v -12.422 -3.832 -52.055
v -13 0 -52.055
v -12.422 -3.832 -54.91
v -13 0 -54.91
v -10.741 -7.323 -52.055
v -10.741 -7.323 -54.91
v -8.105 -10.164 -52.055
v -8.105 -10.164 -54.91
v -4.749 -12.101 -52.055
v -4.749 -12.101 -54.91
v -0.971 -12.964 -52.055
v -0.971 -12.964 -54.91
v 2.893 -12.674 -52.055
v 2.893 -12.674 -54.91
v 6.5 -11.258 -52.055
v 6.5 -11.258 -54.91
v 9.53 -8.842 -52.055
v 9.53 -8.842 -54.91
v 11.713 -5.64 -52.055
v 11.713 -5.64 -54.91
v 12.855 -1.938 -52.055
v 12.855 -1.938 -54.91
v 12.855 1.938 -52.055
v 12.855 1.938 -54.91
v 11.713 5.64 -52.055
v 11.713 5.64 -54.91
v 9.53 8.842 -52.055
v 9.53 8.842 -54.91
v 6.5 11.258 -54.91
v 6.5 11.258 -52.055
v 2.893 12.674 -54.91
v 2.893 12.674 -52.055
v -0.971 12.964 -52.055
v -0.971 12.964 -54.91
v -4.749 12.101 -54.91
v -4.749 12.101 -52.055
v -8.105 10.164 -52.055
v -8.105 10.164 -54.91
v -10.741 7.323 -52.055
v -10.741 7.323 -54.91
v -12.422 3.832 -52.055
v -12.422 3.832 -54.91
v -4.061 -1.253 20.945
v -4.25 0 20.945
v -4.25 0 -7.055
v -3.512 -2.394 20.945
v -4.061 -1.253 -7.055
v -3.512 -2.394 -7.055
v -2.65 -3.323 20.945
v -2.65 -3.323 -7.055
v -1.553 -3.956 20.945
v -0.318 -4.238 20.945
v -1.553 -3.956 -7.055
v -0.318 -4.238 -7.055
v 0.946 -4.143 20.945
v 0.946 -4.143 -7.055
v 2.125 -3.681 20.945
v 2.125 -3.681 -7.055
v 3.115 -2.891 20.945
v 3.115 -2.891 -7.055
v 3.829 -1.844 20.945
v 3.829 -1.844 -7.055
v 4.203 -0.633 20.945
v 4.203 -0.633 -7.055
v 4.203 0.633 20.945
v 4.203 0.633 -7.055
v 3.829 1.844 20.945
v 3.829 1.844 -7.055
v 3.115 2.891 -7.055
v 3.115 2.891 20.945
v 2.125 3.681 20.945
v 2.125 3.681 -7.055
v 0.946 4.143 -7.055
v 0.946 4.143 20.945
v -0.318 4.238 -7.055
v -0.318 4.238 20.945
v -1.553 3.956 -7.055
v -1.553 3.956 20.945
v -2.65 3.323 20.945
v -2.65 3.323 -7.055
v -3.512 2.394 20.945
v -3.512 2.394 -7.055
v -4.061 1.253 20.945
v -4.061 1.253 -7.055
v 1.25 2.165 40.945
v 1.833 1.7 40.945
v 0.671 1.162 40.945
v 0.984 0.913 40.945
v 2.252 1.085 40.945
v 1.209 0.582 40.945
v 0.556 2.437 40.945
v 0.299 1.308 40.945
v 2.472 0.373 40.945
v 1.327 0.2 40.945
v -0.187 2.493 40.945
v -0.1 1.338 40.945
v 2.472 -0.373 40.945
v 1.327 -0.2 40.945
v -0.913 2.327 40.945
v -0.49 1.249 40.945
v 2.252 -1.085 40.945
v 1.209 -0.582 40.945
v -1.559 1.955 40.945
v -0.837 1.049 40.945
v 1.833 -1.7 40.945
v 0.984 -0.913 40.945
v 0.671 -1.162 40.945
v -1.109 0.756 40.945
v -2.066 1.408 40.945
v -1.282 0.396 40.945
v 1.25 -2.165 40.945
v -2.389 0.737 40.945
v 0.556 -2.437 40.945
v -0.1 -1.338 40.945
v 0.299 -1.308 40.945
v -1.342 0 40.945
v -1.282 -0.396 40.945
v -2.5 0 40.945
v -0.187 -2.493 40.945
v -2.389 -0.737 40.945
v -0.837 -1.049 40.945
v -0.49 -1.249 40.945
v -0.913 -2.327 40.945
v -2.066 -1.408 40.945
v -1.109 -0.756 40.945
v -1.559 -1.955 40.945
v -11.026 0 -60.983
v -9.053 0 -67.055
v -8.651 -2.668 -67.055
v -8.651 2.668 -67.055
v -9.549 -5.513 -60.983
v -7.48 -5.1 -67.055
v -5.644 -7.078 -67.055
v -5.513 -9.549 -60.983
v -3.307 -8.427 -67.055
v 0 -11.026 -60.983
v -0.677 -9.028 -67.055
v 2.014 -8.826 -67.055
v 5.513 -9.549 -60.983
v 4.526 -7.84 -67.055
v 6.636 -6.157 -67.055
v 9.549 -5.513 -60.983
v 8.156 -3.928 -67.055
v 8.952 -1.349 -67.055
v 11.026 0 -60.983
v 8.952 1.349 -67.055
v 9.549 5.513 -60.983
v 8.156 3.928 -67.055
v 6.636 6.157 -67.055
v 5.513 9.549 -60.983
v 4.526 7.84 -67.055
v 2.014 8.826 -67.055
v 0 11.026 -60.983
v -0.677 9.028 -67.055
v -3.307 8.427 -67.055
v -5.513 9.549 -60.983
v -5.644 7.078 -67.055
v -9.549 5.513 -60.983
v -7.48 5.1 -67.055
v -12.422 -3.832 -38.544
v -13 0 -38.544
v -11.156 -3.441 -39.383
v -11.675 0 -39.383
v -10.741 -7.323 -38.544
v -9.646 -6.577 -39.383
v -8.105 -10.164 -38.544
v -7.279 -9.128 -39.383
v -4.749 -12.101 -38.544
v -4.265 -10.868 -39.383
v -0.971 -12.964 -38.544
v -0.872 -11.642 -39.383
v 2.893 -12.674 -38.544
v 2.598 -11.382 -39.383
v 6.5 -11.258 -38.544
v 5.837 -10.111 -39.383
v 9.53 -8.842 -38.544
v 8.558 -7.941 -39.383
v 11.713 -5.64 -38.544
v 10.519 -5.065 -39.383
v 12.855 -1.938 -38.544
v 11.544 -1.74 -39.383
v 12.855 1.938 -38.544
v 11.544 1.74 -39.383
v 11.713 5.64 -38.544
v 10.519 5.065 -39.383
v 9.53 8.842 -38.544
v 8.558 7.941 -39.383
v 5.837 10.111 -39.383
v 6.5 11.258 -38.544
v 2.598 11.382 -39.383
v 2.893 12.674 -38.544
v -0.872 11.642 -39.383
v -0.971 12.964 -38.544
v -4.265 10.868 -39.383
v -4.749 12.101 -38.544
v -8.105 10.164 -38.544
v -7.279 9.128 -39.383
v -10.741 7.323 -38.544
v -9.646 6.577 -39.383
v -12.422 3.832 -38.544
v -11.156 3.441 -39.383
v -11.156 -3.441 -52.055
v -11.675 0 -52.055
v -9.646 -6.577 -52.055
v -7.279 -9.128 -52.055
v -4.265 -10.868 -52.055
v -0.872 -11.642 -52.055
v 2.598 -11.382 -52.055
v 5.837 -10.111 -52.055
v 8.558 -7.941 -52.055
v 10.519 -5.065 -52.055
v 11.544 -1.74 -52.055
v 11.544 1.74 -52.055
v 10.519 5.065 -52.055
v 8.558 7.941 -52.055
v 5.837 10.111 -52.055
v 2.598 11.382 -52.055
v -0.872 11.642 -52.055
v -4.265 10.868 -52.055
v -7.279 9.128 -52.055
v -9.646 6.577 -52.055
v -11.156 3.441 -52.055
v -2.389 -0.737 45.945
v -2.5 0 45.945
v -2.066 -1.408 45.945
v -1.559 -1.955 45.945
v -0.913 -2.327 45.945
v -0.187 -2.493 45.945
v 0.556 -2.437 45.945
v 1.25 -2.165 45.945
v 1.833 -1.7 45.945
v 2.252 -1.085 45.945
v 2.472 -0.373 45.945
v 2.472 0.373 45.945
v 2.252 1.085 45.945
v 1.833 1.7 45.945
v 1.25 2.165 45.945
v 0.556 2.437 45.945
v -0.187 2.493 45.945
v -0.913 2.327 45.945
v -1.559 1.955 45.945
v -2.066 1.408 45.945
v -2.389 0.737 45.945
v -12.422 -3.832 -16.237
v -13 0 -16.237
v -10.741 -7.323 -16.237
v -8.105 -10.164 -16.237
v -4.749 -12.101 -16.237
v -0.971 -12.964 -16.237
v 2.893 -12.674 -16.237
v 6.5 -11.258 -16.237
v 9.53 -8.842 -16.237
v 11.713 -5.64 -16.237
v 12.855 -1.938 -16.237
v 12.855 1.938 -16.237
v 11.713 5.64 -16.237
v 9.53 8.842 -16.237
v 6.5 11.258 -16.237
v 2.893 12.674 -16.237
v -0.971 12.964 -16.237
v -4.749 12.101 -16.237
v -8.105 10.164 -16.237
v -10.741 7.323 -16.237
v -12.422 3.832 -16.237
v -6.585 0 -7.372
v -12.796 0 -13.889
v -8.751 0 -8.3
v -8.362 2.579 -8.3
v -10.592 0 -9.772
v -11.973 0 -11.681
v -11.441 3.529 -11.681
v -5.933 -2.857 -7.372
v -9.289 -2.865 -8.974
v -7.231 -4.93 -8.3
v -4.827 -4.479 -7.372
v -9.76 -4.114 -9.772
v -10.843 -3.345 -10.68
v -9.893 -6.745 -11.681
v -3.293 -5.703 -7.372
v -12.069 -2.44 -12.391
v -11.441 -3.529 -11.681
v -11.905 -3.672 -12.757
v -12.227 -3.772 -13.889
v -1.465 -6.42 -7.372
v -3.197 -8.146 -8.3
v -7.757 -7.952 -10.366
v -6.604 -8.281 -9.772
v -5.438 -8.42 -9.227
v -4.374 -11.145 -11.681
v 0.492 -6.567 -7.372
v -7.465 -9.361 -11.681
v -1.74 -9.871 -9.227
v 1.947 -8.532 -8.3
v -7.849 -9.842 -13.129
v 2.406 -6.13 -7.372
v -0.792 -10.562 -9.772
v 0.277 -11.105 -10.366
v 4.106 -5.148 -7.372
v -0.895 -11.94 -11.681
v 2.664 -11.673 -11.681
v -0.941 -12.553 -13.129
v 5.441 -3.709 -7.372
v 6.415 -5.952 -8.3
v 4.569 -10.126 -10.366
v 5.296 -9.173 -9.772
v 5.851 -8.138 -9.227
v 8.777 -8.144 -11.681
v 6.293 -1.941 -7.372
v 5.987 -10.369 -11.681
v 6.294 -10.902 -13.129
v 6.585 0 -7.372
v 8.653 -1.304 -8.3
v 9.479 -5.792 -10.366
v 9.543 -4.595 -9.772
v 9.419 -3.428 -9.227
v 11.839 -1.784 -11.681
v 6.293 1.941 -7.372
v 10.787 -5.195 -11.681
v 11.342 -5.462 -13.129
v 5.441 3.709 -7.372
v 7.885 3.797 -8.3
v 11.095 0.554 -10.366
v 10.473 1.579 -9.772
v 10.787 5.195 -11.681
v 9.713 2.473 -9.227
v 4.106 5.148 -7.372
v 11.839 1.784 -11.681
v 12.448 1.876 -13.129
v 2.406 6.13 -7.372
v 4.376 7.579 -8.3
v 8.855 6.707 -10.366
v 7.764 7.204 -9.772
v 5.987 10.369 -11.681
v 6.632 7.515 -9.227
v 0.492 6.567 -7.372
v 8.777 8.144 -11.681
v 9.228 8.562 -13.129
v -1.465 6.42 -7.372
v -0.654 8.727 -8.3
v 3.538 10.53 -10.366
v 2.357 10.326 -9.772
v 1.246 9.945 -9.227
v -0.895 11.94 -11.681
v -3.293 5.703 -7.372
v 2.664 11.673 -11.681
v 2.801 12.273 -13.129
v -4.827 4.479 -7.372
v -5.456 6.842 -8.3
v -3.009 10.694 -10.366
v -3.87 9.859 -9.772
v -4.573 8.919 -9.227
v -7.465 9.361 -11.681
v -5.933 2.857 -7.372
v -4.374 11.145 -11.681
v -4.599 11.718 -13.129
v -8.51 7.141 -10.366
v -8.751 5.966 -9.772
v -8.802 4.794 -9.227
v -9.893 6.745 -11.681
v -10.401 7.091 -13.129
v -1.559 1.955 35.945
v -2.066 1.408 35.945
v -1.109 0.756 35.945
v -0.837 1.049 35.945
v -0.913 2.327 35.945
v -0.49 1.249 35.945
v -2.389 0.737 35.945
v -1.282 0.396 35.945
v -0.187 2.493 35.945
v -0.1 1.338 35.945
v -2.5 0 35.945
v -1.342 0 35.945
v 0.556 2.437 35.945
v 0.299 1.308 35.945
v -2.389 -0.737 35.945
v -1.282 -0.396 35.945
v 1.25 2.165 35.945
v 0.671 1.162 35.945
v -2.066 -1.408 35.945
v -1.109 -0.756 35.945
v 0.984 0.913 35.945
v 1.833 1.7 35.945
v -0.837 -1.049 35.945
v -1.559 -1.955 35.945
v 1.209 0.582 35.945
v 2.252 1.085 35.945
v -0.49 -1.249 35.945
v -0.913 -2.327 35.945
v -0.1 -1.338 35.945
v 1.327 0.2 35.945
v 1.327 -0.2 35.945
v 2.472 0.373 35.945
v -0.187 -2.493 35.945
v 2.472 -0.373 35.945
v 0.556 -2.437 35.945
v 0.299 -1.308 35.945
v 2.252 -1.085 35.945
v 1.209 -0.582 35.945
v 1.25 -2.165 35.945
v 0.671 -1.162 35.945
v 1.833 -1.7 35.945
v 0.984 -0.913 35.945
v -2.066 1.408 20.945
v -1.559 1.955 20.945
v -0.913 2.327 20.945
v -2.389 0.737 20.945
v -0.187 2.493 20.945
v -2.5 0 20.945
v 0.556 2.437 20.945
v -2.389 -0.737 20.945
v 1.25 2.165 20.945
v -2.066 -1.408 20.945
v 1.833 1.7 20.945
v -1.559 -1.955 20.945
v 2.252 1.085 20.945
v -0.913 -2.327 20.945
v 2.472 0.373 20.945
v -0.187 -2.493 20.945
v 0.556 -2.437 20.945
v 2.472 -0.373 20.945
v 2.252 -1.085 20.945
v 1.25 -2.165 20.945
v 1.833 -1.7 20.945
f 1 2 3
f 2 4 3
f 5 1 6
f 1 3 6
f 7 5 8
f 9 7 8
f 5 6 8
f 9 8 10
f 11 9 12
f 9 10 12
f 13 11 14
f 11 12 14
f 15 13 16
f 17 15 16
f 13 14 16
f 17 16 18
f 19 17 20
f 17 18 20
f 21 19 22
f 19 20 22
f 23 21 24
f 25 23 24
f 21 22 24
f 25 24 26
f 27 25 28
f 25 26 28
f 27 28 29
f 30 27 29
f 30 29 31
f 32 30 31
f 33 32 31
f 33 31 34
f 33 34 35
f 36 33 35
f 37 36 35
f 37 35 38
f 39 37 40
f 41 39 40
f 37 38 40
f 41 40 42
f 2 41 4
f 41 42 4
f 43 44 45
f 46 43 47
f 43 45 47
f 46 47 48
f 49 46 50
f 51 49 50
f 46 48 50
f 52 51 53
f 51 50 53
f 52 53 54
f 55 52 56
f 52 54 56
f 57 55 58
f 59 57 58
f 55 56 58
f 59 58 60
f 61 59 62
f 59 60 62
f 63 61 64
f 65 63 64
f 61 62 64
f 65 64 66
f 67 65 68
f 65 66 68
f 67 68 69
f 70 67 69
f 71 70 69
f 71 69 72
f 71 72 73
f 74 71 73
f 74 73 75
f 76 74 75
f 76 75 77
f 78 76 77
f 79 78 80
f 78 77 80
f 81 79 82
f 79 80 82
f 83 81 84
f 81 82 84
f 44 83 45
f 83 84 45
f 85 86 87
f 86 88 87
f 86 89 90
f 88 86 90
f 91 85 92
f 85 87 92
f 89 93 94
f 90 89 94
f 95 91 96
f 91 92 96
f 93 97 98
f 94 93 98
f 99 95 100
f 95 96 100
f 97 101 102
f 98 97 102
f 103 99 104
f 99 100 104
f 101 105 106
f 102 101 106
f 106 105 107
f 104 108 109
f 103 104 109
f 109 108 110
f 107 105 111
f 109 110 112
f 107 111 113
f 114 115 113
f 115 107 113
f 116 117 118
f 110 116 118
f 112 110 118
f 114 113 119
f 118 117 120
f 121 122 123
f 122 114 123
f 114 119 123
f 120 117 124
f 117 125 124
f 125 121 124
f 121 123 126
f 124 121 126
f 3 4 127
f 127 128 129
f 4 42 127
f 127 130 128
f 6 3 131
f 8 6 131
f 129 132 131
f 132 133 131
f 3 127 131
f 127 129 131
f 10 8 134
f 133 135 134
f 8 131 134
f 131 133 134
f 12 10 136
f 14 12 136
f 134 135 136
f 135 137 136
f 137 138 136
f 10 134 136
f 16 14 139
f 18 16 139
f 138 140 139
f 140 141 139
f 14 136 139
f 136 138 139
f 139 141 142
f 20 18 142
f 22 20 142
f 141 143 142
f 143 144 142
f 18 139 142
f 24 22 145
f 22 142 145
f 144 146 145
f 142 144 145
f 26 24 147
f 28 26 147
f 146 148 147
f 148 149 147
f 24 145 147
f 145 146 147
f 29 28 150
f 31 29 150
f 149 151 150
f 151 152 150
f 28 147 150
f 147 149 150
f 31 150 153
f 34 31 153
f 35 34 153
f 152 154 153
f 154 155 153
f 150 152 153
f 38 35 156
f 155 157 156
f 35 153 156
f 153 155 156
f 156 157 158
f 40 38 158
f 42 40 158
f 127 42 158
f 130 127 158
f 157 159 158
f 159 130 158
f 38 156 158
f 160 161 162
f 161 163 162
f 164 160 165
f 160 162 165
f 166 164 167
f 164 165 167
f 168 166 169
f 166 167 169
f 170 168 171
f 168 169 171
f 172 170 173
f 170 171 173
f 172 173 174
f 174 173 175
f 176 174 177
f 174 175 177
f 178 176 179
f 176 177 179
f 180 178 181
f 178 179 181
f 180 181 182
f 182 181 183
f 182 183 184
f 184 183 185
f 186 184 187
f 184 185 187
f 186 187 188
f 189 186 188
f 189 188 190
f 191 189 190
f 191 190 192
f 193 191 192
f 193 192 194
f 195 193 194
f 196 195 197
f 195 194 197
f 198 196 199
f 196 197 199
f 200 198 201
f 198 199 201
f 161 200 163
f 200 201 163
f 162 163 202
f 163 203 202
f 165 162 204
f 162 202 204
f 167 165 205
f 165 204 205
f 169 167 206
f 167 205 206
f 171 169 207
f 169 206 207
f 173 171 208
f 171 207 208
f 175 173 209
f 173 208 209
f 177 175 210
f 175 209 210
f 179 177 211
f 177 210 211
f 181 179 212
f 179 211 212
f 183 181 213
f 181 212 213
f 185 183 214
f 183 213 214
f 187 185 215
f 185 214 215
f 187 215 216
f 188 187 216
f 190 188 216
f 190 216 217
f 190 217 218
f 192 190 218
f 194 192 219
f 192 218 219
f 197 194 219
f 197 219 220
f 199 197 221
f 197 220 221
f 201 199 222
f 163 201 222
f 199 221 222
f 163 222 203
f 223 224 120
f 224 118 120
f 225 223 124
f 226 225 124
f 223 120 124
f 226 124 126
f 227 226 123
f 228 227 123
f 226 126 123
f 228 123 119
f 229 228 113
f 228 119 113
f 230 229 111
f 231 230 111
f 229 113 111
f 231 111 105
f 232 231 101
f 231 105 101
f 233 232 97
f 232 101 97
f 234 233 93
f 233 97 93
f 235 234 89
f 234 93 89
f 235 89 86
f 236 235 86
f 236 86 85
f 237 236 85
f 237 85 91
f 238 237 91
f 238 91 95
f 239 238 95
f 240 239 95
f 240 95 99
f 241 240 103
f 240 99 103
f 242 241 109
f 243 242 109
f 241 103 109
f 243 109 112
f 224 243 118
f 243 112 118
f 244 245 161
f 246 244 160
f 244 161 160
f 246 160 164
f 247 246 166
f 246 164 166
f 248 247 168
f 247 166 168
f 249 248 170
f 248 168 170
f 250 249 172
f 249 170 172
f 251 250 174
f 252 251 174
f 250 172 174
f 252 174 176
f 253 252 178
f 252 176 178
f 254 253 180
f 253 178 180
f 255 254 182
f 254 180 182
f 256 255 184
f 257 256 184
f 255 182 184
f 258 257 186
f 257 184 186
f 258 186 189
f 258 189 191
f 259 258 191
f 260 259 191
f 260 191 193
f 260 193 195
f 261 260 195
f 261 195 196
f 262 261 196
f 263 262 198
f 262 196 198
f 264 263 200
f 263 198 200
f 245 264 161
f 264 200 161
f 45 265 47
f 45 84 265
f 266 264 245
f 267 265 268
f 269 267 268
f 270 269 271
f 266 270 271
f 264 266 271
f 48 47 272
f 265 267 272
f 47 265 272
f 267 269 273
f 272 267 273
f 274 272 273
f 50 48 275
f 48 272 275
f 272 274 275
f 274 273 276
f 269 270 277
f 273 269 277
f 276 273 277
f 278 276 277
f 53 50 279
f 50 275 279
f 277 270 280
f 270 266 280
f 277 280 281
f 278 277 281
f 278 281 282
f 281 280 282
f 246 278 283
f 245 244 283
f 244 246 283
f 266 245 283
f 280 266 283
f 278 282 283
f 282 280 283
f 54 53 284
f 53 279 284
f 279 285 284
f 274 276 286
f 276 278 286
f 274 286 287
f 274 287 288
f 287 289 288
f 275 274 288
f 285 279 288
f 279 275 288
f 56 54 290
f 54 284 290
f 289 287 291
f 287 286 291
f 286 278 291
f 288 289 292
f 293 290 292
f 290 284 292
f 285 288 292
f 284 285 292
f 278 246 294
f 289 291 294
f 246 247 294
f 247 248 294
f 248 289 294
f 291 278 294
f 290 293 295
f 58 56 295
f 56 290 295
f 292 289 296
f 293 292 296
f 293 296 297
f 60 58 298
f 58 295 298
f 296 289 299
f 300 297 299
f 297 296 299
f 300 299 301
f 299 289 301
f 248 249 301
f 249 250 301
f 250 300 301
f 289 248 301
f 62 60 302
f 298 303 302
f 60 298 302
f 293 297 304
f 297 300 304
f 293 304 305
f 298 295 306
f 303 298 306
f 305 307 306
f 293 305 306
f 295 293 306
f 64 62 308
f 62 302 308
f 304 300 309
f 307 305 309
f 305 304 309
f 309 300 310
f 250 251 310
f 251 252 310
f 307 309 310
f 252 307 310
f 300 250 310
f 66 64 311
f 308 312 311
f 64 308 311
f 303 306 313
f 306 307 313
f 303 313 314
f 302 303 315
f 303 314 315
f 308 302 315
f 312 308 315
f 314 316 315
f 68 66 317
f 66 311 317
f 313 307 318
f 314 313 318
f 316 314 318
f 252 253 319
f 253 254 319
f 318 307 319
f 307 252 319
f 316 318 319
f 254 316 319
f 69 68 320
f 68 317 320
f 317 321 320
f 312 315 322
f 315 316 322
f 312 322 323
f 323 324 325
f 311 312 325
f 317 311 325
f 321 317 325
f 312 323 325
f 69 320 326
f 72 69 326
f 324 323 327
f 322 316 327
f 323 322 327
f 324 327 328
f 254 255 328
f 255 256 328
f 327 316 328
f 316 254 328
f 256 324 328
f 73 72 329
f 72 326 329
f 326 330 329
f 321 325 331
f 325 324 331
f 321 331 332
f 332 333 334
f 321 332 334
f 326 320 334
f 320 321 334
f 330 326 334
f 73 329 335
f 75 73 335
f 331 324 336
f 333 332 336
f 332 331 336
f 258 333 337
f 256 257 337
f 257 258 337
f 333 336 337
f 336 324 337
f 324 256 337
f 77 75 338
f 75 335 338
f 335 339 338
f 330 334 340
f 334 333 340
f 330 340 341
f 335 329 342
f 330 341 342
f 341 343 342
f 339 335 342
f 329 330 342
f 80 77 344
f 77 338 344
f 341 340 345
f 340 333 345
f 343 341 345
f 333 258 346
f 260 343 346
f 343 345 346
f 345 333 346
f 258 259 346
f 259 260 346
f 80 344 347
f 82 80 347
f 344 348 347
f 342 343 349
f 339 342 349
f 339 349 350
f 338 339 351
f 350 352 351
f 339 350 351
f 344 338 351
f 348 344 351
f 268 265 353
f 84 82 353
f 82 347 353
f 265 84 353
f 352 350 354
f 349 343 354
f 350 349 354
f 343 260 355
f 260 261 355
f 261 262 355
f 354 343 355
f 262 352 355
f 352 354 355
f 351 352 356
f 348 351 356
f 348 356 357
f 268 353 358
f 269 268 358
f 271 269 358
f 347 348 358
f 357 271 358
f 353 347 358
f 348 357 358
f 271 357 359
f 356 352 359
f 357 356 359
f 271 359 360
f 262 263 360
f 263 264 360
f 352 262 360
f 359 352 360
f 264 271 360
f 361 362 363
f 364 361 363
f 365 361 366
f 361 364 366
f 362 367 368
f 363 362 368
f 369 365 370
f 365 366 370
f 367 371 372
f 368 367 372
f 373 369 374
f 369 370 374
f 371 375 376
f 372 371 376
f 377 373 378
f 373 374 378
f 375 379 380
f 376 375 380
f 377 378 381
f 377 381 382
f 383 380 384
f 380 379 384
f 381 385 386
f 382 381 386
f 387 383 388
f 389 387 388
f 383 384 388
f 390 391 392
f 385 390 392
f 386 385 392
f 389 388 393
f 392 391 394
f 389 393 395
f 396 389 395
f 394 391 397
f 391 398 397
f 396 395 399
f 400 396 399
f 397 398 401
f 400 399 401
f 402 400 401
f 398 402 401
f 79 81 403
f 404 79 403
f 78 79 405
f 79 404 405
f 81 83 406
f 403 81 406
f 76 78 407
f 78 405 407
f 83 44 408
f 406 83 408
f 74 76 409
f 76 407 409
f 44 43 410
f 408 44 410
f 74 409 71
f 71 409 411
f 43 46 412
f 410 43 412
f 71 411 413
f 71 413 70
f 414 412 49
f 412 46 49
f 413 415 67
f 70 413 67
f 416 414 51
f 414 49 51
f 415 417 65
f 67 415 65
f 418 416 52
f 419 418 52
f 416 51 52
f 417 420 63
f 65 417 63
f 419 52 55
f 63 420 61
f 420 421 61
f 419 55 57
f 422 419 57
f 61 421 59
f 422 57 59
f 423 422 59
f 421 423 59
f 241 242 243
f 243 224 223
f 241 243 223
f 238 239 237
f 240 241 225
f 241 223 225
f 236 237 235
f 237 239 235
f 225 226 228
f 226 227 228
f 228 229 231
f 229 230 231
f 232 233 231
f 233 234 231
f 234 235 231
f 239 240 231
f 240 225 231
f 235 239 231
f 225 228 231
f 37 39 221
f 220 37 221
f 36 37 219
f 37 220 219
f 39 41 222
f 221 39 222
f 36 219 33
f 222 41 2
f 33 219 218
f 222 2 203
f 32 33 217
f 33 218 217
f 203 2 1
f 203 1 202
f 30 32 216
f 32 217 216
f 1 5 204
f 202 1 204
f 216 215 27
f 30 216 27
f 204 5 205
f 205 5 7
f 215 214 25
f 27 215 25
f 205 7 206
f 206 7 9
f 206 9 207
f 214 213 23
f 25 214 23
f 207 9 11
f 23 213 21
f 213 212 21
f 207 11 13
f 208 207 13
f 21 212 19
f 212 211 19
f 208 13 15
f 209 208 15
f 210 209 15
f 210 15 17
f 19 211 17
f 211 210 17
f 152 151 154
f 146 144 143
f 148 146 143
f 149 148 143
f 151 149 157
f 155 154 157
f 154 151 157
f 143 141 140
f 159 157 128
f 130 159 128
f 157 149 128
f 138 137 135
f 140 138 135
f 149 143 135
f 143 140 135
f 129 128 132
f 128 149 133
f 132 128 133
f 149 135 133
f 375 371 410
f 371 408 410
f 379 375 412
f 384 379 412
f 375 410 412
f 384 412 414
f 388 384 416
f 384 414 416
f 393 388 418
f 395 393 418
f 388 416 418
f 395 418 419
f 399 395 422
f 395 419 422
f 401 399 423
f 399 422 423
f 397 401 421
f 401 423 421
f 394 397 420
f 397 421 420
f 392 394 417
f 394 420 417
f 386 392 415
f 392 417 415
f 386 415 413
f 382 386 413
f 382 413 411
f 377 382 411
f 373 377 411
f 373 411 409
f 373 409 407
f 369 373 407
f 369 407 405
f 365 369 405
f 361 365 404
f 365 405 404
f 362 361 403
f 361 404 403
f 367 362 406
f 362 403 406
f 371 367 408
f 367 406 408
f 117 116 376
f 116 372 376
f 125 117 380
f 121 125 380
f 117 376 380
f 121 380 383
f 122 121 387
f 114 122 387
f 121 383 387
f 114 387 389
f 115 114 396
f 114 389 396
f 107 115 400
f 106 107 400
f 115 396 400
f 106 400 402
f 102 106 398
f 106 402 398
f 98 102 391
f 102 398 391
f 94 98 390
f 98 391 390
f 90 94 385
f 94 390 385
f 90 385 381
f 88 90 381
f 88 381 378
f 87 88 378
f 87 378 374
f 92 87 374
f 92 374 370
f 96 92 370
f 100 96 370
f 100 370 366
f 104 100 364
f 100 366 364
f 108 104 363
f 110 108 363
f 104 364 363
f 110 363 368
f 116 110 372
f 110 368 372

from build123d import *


with BuildPart() as f1:
    # F0 (on Front) → F1 (revolve)
    with BuildSketch(Plane.XZ):
        with BuildLine():
            Line((0, -67.055455), (0, 45.944545))
            Line((0, 45.944545), (-2.5, 45.944545))
            Line((-2.5, 45.944545), (-2.5, 40.944545))
            Line((-2.5, 40.944545), (-1.342105, 40.944545))
            Line((-1.342105, 40.944545), (-1.342105, 35.944545))
            Line((-1.342105, 35.944545), (-2.5, 35.944545))
            Line((-2.5, 35.944545), (-2.5, 20.944545))
            Line((-2.5, 20.944545), (-4.25, 20.944545))
            Line((-4.25, 20.944545), (-4.25, -7.055455))
            ThreePointArc((-4.25, -7.055455), (-10.591536, -9.772009), (-13, -16.23684))
            Line((-13, -16.23684), (-13, -38.544123))
            Line((-13, -38.544123), (-11.674659, -39.383397))
            Line((-11.674659, -39.383397), (-11.674659, -52.055455))
            Line((-11.674659, -52.055455), (-13, -52.055455))
            Line((-13, -52.055455), (-13, -54.909937))
            Line((-13, -54.909937), (-9.052842, -67.055455))
            Line((-9.052842, -67.055455), (0, -67.055455))
        make_face()
    revolve(axis=Axis((0, 0, -10.555455), (0, 0, 1)))


solid = f1.part
